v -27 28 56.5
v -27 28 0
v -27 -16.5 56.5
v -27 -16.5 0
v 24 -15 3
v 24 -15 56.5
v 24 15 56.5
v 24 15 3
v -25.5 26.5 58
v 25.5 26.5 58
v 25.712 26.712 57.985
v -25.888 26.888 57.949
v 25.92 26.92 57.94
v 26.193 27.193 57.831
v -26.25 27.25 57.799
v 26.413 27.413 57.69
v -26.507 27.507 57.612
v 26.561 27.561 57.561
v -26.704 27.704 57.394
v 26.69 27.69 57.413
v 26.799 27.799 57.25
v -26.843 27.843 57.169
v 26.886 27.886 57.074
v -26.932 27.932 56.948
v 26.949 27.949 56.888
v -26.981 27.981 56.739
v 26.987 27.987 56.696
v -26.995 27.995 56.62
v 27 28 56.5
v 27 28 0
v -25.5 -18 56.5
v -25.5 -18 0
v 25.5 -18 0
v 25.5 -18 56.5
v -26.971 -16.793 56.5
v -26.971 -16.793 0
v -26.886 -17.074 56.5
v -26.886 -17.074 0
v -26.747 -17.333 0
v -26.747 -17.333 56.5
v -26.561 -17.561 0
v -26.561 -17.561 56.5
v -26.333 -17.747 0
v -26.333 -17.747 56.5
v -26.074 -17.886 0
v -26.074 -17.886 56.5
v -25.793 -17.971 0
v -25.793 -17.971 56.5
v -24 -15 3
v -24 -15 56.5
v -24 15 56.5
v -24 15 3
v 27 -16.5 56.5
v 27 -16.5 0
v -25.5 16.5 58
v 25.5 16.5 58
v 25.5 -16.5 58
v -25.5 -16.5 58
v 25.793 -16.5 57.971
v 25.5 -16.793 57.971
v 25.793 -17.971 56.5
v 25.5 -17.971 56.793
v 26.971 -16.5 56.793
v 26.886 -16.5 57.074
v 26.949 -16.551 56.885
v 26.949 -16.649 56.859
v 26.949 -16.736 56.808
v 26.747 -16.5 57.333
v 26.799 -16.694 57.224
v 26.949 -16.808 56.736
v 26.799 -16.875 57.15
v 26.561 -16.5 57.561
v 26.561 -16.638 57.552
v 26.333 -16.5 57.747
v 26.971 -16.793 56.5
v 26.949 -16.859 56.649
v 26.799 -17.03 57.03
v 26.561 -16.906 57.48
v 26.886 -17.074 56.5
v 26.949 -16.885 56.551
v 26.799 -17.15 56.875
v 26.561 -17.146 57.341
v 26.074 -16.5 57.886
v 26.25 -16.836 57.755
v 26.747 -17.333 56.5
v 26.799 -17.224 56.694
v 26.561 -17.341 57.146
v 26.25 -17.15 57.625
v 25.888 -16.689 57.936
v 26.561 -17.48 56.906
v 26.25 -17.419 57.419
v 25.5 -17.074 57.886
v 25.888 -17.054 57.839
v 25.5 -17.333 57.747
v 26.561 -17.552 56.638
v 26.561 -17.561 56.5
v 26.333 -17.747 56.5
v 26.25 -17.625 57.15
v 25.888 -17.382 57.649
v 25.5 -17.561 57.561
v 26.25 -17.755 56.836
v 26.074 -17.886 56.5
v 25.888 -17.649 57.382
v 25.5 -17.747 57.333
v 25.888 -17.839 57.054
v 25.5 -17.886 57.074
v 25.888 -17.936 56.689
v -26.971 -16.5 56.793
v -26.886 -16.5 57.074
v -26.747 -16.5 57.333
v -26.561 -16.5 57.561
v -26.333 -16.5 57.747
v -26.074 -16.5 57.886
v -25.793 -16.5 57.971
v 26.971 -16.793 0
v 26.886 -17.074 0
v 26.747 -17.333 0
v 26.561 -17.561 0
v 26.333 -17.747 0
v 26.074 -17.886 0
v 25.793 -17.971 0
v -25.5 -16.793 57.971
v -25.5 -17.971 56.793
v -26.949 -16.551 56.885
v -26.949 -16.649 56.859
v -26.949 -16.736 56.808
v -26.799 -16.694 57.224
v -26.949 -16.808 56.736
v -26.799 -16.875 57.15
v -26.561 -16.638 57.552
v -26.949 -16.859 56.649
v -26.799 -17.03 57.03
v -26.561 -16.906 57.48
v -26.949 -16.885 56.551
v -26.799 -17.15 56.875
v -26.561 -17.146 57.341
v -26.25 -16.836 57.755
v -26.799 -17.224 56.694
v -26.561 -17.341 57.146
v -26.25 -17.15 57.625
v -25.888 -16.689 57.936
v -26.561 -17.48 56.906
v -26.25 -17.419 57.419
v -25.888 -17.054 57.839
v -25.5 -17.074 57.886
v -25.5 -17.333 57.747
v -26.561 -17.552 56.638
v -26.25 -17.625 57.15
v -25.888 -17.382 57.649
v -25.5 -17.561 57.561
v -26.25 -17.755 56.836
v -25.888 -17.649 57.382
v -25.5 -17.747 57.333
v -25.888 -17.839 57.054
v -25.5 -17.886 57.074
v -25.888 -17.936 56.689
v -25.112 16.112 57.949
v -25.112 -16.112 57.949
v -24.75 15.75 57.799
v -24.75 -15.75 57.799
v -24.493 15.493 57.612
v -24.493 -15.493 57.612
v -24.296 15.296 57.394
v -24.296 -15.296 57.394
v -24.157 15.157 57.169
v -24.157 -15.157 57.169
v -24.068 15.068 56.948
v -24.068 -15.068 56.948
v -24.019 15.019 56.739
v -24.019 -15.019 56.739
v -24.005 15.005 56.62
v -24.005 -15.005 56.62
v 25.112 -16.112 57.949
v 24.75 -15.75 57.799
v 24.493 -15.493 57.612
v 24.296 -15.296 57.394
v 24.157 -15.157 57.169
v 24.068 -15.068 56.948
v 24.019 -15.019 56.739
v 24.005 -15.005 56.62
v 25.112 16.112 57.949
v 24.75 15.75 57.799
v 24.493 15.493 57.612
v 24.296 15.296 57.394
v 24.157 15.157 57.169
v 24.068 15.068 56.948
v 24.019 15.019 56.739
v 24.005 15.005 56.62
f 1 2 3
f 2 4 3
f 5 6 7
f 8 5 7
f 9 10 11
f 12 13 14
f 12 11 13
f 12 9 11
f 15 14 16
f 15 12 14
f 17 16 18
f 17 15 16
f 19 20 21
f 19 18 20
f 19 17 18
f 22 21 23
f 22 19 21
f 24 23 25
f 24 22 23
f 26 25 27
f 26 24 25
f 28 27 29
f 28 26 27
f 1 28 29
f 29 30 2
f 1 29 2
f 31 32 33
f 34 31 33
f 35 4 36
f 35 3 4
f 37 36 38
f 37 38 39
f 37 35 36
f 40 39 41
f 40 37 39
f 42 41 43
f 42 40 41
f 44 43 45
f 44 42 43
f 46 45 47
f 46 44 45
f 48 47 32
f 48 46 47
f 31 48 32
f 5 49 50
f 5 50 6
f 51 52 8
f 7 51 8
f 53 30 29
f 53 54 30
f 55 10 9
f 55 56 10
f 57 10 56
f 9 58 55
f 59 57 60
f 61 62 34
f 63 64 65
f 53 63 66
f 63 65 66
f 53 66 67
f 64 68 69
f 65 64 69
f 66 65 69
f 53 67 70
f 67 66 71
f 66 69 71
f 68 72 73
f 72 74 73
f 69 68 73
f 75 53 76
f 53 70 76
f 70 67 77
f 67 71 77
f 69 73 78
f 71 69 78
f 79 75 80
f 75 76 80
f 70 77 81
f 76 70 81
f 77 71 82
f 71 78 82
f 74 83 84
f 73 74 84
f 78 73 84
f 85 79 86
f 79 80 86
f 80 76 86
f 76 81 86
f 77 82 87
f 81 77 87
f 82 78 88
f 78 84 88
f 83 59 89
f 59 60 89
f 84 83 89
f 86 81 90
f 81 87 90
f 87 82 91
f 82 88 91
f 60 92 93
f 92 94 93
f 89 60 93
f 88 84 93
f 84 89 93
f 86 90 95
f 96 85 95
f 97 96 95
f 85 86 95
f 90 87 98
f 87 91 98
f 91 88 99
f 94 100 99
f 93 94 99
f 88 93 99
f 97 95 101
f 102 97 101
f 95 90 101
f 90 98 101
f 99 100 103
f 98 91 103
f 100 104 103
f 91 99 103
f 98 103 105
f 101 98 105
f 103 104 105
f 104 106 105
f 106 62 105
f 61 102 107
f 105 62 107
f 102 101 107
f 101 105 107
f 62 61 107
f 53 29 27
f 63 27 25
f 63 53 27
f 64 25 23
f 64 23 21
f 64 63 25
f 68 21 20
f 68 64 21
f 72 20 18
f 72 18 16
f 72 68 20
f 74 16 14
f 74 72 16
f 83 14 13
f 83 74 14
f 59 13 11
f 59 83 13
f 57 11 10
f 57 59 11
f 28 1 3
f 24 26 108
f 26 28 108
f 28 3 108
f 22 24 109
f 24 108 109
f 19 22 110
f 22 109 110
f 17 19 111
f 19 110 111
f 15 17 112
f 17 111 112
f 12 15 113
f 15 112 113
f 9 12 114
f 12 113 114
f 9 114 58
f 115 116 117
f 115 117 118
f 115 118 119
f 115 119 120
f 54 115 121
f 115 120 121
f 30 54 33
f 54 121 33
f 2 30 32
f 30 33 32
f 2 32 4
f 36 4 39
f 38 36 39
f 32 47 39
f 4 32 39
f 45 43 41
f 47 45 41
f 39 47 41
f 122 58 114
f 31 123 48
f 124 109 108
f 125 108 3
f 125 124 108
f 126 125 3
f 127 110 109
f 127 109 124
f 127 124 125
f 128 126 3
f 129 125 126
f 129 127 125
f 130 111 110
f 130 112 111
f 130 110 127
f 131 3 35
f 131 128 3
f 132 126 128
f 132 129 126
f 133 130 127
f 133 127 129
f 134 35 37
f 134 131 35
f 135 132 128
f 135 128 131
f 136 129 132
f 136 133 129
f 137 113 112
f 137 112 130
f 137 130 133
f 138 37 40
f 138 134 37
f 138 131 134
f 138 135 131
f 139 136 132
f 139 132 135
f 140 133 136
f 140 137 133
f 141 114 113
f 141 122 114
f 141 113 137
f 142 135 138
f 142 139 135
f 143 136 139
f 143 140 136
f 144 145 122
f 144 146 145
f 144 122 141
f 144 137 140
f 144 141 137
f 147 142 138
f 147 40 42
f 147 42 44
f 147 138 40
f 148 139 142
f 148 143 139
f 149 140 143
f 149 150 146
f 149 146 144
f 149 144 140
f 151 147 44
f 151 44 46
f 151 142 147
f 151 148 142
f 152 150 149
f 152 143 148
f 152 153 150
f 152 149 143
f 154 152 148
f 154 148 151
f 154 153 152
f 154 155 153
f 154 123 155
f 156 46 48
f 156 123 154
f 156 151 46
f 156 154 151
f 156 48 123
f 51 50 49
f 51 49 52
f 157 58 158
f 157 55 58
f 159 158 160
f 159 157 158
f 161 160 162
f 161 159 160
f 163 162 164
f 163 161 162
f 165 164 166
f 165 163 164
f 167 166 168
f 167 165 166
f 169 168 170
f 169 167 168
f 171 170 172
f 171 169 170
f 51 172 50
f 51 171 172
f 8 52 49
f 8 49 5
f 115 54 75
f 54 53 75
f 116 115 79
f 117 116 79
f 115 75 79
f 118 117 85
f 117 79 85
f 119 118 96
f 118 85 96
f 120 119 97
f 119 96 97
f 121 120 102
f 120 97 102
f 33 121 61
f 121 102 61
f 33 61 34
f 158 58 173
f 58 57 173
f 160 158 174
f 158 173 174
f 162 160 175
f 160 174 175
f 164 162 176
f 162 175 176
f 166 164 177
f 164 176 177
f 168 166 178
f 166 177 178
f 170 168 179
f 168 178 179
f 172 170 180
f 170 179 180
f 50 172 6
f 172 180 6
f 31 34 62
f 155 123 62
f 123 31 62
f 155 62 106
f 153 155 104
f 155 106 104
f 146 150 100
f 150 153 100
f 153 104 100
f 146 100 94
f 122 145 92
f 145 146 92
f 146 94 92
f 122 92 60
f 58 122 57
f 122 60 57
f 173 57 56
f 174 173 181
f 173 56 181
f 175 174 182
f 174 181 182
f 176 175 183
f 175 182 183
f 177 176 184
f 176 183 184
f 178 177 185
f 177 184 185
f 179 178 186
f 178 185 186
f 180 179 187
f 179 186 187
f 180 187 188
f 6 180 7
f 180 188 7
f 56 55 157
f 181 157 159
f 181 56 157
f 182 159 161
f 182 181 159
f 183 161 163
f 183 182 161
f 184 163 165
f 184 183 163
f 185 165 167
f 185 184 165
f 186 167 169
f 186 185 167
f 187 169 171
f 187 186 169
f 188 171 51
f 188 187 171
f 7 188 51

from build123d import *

# Parameters (mm, degrees)
F0_W     = 54
F0_H     = 36
F1_DEPTH = 58
F2_T     = -3
F3_W     = 54
F3_H     = 58
F4_DEPTH = 10
F5_R     = 1.49999


# Not quite as in the source:
# - a fillet or chamfer is up to 0.001 mm smaller than in the source, because OpenCascade refuses the exact size


with BuildPart() as f1:
    # F0 (on Top) → F1 (new body)
    with BuildSketch(Plane.XY):
        Rectangle(F0_W, F0_H)
    extrude(amount=F1_DEPTH)

    # F2
    f2_openings = [f1.faces().sort_by_distance(p)[0] for p in [
        (0, 0, 58),
    ]]
    offset(amount=F2_T, openings=f2_openings)

    # F3 (on face) → F4 (join)
    with BuildSketch(Plane(origin=(0, 18, 0), x_dir=(-1, 0, 0), z_dir=(0, 1, 0))):
        with Locations((0, 29)):
            Rectangle(F3_W, F3_H)
    extrude(amount=F4_DEPTH)

    # F5 (radius 1.5 in the source; OpenCascade refuses exactly that, so slightly less here)
    f5_edges = [f1.edges().sort_by_distance(p)[0] for p in [
        (0, -18, 58),
        (27, 5, 58),
        (0, 28, 58),
        (-27, 5, 58),
        (0, -15, 58),
        (-24, 0, 58),
        (0, 15, 58),
        (24, 0, 58),
        (-27, -18, 29),
        (27, -18, 29),
    ]]
    fillet(f5_edges, radius=F5_R)


solid = f1.part
